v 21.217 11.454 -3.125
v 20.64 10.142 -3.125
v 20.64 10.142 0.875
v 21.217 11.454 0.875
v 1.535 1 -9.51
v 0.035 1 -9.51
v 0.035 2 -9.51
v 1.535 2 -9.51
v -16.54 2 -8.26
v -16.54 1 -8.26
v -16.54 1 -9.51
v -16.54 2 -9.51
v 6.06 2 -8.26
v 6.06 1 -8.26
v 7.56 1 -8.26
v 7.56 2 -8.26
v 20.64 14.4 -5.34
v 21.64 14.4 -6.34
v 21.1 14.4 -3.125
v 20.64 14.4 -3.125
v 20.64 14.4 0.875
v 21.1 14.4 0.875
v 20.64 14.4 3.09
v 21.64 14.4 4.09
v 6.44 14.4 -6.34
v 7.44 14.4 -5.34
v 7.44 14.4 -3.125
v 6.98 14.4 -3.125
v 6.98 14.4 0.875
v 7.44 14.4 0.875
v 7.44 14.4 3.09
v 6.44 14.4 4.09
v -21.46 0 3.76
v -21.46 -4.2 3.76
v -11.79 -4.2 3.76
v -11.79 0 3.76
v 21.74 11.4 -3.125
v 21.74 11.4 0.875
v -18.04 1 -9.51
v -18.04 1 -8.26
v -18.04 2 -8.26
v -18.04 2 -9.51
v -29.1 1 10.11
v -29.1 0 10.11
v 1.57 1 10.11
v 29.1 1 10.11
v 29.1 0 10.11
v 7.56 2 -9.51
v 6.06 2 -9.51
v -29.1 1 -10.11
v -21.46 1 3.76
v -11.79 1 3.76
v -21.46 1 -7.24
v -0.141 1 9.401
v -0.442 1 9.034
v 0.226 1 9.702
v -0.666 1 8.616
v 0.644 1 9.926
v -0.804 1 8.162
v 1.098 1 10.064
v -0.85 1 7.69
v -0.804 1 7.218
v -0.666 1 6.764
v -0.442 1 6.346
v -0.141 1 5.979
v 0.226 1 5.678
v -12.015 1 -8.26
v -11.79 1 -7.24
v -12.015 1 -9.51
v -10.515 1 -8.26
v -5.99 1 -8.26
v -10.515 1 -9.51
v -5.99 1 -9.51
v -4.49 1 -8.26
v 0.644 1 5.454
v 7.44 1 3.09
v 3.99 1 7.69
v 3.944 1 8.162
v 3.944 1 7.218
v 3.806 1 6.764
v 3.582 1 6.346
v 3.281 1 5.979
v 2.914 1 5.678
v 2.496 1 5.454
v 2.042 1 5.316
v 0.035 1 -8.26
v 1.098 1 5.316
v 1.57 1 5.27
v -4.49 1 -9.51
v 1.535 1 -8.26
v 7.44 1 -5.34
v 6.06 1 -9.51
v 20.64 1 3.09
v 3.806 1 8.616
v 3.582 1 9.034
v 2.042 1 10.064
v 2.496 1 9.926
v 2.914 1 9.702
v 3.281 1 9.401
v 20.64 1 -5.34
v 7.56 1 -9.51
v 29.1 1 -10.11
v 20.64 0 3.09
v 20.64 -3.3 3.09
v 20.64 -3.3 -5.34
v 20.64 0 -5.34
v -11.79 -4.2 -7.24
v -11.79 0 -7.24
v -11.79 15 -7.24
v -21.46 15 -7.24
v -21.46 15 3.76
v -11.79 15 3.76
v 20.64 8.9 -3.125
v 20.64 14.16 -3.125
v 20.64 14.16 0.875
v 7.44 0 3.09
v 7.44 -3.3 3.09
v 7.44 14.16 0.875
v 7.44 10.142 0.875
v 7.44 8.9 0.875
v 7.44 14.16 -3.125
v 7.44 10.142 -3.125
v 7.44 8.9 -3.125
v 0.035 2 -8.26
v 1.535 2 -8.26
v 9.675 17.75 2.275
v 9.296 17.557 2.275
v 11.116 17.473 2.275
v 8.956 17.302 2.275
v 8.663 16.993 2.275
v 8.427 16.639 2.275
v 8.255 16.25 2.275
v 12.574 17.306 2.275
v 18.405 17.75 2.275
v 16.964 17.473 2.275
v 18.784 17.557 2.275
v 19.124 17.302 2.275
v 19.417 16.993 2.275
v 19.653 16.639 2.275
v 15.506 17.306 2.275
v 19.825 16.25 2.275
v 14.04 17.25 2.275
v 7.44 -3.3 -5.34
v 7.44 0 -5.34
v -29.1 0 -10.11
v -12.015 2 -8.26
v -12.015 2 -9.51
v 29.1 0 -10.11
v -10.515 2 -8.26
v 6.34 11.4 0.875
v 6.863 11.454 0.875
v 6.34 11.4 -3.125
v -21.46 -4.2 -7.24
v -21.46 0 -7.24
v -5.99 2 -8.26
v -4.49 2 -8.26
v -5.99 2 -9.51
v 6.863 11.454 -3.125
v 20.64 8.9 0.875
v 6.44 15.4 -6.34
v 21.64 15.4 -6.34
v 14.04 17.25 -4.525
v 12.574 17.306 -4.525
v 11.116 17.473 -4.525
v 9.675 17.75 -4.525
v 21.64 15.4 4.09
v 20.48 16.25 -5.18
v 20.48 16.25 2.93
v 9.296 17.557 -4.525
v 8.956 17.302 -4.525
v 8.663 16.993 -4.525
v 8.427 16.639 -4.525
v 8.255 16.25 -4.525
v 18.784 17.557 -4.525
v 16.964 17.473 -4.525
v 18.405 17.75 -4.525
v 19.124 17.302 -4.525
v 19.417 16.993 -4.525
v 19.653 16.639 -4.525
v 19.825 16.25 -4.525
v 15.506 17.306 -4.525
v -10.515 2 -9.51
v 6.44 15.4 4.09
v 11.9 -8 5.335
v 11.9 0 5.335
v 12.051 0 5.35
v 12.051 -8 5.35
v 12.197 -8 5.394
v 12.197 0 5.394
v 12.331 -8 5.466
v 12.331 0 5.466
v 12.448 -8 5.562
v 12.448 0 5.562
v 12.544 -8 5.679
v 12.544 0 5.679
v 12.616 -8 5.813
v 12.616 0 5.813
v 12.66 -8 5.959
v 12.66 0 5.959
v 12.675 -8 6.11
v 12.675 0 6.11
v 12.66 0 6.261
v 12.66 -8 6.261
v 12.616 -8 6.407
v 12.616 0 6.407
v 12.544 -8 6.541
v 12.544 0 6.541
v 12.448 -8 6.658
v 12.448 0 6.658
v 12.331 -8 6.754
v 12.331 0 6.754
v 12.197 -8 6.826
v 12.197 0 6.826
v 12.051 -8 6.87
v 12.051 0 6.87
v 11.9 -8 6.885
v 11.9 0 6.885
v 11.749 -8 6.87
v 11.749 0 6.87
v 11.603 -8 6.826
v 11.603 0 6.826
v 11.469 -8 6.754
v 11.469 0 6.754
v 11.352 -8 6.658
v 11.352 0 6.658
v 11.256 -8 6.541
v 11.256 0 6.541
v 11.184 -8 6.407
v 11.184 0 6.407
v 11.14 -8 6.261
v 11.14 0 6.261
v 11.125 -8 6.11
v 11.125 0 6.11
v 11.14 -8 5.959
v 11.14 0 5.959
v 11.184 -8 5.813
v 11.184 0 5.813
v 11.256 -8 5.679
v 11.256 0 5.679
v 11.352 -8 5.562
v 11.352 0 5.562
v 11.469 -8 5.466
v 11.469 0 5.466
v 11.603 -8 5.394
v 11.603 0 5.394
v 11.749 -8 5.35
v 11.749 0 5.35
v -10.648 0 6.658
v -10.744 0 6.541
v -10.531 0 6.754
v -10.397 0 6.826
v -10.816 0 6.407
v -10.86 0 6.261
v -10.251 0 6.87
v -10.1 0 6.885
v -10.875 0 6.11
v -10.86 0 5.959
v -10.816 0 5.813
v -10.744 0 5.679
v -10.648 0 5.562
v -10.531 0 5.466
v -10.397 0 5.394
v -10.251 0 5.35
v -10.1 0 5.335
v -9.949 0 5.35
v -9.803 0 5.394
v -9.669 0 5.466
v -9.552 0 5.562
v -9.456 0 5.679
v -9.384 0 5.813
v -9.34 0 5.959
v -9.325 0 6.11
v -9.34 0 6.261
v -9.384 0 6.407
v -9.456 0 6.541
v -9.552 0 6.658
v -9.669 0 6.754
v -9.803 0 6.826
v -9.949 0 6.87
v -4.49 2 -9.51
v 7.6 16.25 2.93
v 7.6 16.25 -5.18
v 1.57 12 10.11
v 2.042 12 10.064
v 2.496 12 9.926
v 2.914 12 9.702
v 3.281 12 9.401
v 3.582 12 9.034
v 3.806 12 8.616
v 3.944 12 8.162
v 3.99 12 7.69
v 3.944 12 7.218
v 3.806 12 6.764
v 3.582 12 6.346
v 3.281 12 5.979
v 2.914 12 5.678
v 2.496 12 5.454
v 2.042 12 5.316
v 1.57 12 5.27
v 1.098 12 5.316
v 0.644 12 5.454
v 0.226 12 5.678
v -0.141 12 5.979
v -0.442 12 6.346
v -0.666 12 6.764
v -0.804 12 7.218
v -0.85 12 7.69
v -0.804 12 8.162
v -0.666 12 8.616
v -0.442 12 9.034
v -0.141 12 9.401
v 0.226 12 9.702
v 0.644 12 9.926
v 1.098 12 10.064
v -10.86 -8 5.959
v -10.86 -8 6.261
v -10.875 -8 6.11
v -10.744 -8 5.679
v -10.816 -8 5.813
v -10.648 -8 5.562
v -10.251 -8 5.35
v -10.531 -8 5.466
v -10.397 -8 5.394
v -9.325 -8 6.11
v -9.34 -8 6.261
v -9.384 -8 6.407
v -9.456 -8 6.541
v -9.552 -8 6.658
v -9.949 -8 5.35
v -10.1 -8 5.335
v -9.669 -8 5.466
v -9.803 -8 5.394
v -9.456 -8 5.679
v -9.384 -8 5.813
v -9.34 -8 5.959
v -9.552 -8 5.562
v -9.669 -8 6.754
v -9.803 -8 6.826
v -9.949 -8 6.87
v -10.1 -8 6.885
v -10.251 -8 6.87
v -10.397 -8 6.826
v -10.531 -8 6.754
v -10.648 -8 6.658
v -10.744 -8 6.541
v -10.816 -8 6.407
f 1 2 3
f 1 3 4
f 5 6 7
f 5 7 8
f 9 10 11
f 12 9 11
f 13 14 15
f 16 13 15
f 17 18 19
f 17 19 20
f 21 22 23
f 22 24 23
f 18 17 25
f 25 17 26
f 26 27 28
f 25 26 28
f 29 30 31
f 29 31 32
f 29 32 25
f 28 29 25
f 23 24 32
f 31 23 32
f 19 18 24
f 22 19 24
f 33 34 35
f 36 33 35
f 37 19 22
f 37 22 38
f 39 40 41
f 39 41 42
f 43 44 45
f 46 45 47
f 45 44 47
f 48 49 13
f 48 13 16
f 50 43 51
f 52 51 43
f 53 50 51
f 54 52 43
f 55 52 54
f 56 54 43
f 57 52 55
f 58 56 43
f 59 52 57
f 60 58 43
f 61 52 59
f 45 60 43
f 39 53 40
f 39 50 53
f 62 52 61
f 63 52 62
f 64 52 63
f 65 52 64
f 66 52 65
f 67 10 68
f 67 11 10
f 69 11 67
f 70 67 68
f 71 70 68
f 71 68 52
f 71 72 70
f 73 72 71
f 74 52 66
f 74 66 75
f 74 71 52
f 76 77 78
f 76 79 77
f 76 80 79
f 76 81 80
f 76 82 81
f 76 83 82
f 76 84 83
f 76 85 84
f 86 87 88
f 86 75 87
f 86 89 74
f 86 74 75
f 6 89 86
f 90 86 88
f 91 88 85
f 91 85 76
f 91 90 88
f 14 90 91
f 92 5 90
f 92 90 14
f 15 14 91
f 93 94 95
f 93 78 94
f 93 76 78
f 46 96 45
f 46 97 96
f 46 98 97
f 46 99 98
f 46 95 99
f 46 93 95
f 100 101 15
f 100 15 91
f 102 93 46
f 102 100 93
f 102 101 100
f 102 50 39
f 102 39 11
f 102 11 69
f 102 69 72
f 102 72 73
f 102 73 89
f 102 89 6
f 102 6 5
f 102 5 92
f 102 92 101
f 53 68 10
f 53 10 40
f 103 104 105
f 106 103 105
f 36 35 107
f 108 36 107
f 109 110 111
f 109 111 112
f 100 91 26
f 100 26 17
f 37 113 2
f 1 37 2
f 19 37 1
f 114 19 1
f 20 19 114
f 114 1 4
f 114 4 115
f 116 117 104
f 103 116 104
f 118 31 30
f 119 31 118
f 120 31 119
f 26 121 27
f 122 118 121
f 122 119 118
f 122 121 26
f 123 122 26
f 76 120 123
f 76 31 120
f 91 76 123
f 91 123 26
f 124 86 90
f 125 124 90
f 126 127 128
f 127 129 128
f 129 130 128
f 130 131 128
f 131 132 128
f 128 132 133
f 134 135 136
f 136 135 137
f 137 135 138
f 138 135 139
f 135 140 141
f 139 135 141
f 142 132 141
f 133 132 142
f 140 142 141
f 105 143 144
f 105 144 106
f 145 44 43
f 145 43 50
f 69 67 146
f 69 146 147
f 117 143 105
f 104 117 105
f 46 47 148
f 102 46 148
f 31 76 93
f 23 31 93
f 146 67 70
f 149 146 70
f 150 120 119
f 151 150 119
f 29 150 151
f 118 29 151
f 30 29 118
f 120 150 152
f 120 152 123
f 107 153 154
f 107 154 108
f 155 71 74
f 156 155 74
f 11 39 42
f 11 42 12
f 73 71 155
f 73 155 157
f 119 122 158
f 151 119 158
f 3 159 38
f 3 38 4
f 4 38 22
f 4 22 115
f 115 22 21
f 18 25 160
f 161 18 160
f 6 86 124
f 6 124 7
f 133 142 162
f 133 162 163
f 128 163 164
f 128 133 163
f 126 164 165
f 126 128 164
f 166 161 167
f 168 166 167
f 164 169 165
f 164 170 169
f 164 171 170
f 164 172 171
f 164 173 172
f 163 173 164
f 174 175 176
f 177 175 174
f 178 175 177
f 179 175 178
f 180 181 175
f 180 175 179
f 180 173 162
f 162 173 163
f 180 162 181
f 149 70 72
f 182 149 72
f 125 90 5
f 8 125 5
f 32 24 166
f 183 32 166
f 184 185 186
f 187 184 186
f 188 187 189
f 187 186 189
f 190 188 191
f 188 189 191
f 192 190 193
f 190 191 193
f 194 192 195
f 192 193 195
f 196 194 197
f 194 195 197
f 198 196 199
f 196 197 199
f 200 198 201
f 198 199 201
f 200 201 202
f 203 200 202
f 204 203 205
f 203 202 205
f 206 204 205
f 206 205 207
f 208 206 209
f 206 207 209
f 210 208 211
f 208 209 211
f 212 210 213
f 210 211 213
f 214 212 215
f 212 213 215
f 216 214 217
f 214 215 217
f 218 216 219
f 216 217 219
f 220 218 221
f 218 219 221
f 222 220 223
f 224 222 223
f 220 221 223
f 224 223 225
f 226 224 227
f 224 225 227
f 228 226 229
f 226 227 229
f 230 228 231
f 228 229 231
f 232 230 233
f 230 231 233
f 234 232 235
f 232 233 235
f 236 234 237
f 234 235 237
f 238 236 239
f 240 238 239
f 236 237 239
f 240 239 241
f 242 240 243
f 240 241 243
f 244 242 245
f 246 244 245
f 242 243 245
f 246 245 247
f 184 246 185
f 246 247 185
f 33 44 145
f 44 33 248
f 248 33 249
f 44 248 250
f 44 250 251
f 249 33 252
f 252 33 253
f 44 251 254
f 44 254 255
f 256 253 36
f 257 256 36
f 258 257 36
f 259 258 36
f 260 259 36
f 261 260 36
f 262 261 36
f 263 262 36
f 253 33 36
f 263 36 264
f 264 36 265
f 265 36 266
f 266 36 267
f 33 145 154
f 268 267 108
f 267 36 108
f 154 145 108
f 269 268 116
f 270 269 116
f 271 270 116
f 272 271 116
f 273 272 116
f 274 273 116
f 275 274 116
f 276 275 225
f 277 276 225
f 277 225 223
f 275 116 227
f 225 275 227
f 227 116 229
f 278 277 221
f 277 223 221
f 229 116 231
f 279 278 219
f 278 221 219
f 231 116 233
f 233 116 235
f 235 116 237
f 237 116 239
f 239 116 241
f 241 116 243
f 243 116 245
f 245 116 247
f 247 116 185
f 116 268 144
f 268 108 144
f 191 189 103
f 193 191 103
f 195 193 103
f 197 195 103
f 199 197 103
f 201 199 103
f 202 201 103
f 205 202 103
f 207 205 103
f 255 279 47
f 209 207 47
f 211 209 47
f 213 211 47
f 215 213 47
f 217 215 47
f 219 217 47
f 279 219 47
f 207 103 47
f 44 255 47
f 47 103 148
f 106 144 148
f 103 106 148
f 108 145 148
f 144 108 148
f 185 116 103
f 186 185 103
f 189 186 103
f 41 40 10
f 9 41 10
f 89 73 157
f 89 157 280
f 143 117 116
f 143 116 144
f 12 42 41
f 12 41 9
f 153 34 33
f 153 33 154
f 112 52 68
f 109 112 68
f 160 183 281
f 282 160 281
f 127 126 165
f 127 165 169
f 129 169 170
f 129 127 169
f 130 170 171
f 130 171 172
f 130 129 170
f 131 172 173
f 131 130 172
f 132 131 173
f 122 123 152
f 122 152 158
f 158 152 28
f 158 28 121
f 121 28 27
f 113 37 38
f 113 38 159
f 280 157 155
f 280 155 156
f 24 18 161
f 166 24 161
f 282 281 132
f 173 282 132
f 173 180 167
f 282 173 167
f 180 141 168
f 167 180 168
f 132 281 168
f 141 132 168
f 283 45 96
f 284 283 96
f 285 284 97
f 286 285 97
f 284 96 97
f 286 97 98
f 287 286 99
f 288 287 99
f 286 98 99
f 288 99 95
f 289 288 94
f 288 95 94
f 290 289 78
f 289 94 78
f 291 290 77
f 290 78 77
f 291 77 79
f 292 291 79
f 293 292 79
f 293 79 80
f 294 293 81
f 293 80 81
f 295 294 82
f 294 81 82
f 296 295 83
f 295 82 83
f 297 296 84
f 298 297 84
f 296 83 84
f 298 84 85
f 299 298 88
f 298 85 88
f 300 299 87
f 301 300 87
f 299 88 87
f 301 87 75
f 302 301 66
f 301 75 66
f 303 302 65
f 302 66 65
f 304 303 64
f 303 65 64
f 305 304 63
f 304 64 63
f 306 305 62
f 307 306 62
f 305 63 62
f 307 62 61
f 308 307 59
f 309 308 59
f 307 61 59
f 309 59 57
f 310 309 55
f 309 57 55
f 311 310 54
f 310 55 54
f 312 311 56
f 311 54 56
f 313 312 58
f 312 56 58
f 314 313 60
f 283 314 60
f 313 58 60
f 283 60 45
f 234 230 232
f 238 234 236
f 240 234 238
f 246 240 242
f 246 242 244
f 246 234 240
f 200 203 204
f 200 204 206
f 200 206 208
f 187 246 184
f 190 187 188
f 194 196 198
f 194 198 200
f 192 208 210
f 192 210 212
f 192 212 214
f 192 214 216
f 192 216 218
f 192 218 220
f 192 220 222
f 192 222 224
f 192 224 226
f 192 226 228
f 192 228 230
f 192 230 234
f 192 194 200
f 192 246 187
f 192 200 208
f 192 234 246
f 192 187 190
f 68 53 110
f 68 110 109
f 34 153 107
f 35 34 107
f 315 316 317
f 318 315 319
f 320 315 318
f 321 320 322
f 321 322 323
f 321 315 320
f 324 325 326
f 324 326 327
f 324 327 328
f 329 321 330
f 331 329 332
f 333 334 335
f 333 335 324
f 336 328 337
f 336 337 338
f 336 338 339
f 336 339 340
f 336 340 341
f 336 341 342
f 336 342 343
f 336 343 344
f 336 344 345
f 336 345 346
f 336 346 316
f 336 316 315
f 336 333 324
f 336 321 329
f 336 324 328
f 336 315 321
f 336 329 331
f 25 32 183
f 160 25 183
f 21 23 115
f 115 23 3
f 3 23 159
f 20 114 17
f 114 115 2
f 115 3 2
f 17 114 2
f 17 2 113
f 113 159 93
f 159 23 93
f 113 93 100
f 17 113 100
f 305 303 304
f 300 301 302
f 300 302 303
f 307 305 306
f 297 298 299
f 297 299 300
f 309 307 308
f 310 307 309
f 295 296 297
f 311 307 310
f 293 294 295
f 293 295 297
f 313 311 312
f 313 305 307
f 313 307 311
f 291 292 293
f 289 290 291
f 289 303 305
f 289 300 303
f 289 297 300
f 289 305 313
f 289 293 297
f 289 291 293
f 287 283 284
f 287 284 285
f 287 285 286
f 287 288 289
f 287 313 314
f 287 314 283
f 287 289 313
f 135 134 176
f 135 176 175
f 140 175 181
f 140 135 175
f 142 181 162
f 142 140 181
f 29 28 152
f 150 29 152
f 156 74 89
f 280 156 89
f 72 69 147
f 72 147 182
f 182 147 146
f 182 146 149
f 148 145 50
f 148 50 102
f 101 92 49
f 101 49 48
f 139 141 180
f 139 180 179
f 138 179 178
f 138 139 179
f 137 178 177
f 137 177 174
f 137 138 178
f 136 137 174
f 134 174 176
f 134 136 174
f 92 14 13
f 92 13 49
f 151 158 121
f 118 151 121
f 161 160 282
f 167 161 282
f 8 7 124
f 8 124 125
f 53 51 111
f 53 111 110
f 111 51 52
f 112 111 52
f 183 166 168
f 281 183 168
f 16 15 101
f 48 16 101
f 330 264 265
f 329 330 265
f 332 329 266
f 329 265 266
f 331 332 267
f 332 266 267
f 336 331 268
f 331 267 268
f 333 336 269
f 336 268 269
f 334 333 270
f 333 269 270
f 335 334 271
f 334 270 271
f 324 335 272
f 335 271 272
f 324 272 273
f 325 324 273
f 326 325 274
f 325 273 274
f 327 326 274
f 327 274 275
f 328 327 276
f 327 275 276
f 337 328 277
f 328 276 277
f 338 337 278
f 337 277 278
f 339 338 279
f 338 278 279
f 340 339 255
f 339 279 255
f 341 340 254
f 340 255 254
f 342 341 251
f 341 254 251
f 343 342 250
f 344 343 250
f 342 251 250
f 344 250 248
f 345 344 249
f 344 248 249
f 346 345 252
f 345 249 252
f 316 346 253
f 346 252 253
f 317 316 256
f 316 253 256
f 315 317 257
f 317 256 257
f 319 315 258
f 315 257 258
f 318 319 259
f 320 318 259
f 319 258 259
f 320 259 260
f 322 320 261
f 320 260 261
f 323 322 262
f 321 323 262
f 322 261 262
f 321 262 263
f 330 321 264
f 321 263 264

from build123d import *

# Parameters (mm, degrees)
SKETCH1_W                = 58.2
SKETCH1_H                = 20.22
BOSS_EXTRUDE1_DEPTH      = 1
BOSS_EXTRUDE2_DEPTH      = 14
BOSS_EXTRUDE2_DEPTH_BACK = 5.2
SKETCH2_W                = 9.67
SKETCH2_H                = 11
SKETCH3_R                = 2.42
BOSS_EXTRUDE3_DEPTH      = 11
BOSS_EXTRUDE4_DEPTH      = 13.4
BOSS_EXTRUDE4_DEPTH_BACK = 4.3
SKETCH4_W                = 13.2
SKETCH4_H                = 8.43
SKETCH7_W                = 11.57
SKETCH7_H                = 6.8
BOSS_EXTRUDE5_DEPTH      = 3.35
CUT_EXTRUDE1_DEPTH       = 38.095225097
CUT_EXTRUDE1_DEPTH_BACK  = 38.095225097
EXTRUDE_THIN2_DEPTH      = 2
SKETCH10_R               = 0.775
BOSS_EXTRUDE6_DEPTH      = 8
SKETCH12_W               = 1.5
SKETCH12_H               = 1.25
BOSS_EXTRUDE7_DEPTH      = 1


with BuildPart() as part:
    # Sketch1 → Boss-Extrude1 (new body)
    with BuildSketch(Plane(origin=(0, 0, 0), x_dir=(1, 0, 0), z_dir=(0, 1, 0))):
        Rectangle(SKETCH1_W, SKETCH1_H)
    extrude(amount=BOSS_EXTRUDE1_DEPTH)

    # Sketch2 → Boss-Extrude2 (add, two sides: drawn at the far end of the back side and taken through both)
    with BuildSketch(Plane(origin=(0, 1, 0), x_dir=(1, 0, 0), z_dir=(0, 1, 0)).offset(-BOSS_EXTRUDE2_DEPTH_BACK)):
        with Locations((-16.625, 1.74)):
            Rectangle(SKETCH2_W, SKETCH2_H)
    extrude(amount=BOSS_EXTRUDE2_DEPTH + BOSS_EXTRUDE2_DEPTH_BACK)

    # Sketch3 → Boss-Extrude3 (add)
    with BuildSketch(Plane(origin=(0, 1, 0), x_dir=(1, 0, 0), z_dir=(0, 1, 0))):
        with Locations(Location((1.57, -7.69, 0), (0, 0, 270))):
            Circle(SKETCH3_R)
    extrude(amount=BOSS_EXTRUDE3_DEPTH)

    # Sketch4 → Boss-Extrude4 (add, two sides: drawn at the far end of the back side and taken through both)
    with BuildSketch(Plane(origin=(0, 1, 0), x_dir=(1, 0, 0), z_dir=(0, 1, 0)).offset(-BOSS_EXTRUDE4_DEPTH_BACK)):
        with Locations((14.04, 1.125)):
            Rectangle(SKETCH4_W, SKETCH4_H)
    extrude(amount=BOSS_EXTRUDE4_DEPTH + BOSS_EXTRUDE4_DEPTH_BACK)

    # Sweep1: sweep along a path in Sketch6
    with BuildLine(Plane(origin=(0, 14.4, 0), x_dir=(1, 0, 0), z_dir=(0, 1, 0))) as sweep1_path:
        Line((7.44, 5.34), (7.44, -3.09))
        Line((7.44, -3.09), (20.64, -3.09))
        Line((20.64, -3.09), (20.64, 5.34))
        Line((20.64, 5.34), (7.44, 5.34))
    # Sketch5 → Sweep1 (sweep)
    with BuildSketch(Plane.ZY.offset(-7.44)):
        Polygon((3.09, 14.4), (4.09, 14.4), (4.09, 15.4), (2.93, 16.25), (2.275, 16.25), (2.275, 14.4), align=None)
    sweep(path=sweep1_path.line, transition=Transition.RIGHT)

    # Sketch7 → Boss-Extrude5 (add)
    with BuildSketch(Plane(origin=(0, 14.4, 0), x_dir=(1, 0, 0), z_dir=(0, 1, 0))):
        with Locations((14.04, 1.125)):
            Rectangle(SKETCH7_W, SKETCH7_H)
    extrude(amount=BOSS_EXTRUDE5_DEPTH)

    # Sketch8 → Cut-Extrude1 (cut, two sides: drawn at the far end of the back side and taken through both)
    with BuildSketch(Plane(origin=(0, 0, -4.525), x_dir=(-1, 0, 0), z_dir=(0, 0, -1)).offset(-CUT_EXTRUDE1_DEPTH_BACK)):
        with BuildLine():
            ThreePointArc((-19.825, 16.25), (-19.277156121, 17.153507794), (-18.405, 17.75))
            Line((-18.405, 17.75), (-19.825, 17.75))
            Line((-19.825, 17.75), (-19.825, 16.25))
        make_face()
        with BuildLine():
            ThreePointArc((-18.405, 17.75), (-16.236771779, 17.375407367), (-14.04, 17.25))
            Line((-14.04, 17.25), (-14.04, 17.75))
            Line((-14.04, 17.75), (-18.405, 17.75))
        make_face()
        with BuildLine():
            Line((-14.04, 17.75), (-14.04, 17.25))
            ThreePointArc((-14.04, 17.25), (-11.843228221, 17.375407367), (-9.675, 17.75))
            Line((-9.675, 17.75), (-14.04, 17.75))
        make_face()
        with BuildLine():
            Line((-8.255, 17.75), (-9.675, 17.75))
            ThreePointArc((-9.675, 17.75), (-8.802843879, 17.153507794), (-8.255, 16.25))
            Line((-8.255, 16.25), (-8.255, 17.75))
        make_face()
    extrude(amount=CUT_EXTRUDE1_DEPTH + CUT_EXTRUDE1_DEPTH_BACK, mode=Mode.SUBTRACT)

    # Sketch9 → Extrude-Thin2 (add, symmetric)
    with BuildSketch(Plane(origin=(0, 0, -1.125), x_dir=(-1, 0, 0), z_dir=(0, 0, -1))):
        Polygon((-20.988853725, 14.920998164), (-21.1, 14.4), (-21.74, 11.4), (-19.788926462, 6.965741958), (-19.331268945, 7.167111265), (-21.217317359, 11.453584933), (-20.611003582, 14.295680764), (-20.499857307, 14.816678928), align=None)
    extrude_thin2 = extrude(amount=EXTRUDE_THIN2_DEPTH, both=True)

    # Mirror1: Extrude-Thin2 across plane
    add(extrude_thin2.mirror(Plane(origin=(14.04, 0, 0), x_dir=(0, 0, 1), z_dir=(1, 0, 0))))

    # Sketch10 → Boss-Extrude6 (add)
    with BuildSketch(Plane.XZ):
        with Locations(Location((-10.1, 6.11, 0), (0, 0, 270))):
            Circle(SKETCH10_R)
        with Locations(Location((11.9, 6.11, 0), (0, 0, 270))):
            Circle(SKETCH10_R)
    extrude(amount=BOSS_EXTRUDE6_DEPTH)

    # Sketch12 → Boss-Extrude7 (add)
    with BuildSketch(Plane(origin=(0, 1, 0), x_dir=(1, 0, 0), z_dir=(0, 1, 0))):
        with Locations((-17.29, 8.885)):
            Rectangle(SKETCH12_W, SKETCH12_H)
        with Locations((-11.265, 8.885)):
            Rectangle(SKETCH12_W, SKETCH12_H)
        with Locations((-5.24, 8.885)):
            Rectangle(SKETCH12_W, SKETCH12_H)
        with Locations((0.785, 8.885)):
            Rectangle(SKETCH12_W, SKETCH12_H)
        with Locations((6.81, 8.885)):
            Rectangle(SKETCH12_W, SKETCH12_H)
    extrude(amount=BOSS_EXTRUDE7_DEPTH)


solid = part.part
